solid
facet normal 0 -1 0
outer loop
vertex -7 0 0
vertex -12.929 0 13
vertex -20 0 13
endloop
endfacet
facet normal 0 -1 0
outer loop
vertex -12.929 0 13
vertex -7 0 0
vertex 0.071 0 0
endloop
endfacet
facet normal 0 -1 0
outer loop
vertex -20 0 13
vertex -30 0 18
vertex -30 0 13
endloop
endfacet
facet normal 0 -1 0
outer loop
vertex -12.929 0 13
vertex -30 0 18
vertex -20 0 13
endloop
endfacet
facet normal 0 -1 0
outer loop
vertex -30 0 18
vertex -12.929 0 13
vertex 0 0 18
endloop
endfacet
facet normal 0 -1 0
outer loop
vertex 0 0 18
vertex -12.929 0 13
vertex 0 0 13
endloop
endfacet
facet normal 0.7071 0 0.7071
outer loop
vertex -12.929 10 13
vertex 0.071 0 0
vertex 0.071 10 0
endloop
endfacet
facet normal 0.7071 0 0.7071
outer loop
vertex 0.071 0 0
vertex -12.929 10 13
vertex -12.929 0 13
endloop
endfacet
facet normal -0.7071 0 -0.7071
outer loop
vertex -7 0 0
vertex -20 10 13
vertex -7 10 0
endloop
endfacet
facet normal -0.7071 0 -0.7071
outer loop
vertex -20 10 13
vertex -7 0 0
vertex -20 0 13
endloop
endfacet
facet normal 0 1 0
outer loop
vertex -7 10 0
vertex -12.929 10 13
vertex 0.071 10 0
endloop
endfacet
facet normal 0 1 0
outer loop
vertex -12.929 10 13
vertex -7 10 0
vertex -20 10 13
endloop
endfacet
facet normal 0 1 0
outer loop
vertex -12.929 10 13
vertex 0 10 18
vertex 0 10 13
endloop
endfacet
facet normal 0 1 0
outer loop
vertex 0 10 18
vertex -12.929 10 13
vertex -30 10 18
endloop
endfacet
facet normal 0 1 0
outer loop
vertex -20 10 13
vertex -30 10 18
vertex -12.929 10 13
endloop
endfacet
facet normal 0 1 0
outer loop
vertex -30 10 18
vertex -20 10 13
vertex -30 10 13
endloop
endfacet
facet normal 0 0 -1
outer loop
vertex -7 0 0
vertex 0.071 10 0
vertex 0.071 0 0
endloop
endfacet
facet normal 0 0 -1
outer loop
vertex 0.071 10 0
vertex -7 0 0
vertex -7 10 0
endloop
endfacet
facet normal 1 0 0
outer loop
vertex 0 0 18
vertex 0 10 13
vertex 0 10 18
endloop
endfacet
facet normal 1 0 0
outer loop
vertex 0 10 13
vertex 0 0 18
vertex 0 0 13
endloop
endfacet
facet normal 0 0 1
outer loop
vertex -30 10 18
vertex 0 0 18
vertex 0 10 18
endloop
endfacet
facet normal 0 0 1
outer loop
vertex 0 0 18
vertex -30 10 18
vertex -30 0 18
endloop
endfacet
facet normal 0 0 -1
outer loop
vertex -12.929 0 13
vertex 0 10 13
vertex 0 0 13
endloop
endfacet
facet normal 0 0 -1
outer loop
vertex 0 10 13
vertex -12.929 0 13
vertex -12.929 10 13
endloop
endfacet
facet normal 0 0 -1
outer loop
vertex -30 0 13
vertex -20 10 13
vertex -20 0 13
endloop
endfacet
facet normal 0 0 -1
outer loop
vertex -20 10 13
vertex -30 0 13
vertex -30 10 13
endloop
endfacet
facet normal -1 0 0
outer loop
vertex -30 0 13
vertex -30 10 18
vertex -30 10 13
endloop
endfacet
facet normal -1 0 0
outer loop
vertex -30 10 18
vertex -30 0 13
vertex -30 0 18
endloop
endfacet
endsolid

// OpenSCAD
union() {
difference() {
  translate([0, 0, -7])
    rotate([0, -45, 0])
    cube(size=[5, 10, 30], center=false);

    translate([-50, -50, -8])
      cube(size = [100, 100, 8], center=false);
}
translate([-30, 0, 13])
  cube(size = [30, 10, 5], center=false);
}
